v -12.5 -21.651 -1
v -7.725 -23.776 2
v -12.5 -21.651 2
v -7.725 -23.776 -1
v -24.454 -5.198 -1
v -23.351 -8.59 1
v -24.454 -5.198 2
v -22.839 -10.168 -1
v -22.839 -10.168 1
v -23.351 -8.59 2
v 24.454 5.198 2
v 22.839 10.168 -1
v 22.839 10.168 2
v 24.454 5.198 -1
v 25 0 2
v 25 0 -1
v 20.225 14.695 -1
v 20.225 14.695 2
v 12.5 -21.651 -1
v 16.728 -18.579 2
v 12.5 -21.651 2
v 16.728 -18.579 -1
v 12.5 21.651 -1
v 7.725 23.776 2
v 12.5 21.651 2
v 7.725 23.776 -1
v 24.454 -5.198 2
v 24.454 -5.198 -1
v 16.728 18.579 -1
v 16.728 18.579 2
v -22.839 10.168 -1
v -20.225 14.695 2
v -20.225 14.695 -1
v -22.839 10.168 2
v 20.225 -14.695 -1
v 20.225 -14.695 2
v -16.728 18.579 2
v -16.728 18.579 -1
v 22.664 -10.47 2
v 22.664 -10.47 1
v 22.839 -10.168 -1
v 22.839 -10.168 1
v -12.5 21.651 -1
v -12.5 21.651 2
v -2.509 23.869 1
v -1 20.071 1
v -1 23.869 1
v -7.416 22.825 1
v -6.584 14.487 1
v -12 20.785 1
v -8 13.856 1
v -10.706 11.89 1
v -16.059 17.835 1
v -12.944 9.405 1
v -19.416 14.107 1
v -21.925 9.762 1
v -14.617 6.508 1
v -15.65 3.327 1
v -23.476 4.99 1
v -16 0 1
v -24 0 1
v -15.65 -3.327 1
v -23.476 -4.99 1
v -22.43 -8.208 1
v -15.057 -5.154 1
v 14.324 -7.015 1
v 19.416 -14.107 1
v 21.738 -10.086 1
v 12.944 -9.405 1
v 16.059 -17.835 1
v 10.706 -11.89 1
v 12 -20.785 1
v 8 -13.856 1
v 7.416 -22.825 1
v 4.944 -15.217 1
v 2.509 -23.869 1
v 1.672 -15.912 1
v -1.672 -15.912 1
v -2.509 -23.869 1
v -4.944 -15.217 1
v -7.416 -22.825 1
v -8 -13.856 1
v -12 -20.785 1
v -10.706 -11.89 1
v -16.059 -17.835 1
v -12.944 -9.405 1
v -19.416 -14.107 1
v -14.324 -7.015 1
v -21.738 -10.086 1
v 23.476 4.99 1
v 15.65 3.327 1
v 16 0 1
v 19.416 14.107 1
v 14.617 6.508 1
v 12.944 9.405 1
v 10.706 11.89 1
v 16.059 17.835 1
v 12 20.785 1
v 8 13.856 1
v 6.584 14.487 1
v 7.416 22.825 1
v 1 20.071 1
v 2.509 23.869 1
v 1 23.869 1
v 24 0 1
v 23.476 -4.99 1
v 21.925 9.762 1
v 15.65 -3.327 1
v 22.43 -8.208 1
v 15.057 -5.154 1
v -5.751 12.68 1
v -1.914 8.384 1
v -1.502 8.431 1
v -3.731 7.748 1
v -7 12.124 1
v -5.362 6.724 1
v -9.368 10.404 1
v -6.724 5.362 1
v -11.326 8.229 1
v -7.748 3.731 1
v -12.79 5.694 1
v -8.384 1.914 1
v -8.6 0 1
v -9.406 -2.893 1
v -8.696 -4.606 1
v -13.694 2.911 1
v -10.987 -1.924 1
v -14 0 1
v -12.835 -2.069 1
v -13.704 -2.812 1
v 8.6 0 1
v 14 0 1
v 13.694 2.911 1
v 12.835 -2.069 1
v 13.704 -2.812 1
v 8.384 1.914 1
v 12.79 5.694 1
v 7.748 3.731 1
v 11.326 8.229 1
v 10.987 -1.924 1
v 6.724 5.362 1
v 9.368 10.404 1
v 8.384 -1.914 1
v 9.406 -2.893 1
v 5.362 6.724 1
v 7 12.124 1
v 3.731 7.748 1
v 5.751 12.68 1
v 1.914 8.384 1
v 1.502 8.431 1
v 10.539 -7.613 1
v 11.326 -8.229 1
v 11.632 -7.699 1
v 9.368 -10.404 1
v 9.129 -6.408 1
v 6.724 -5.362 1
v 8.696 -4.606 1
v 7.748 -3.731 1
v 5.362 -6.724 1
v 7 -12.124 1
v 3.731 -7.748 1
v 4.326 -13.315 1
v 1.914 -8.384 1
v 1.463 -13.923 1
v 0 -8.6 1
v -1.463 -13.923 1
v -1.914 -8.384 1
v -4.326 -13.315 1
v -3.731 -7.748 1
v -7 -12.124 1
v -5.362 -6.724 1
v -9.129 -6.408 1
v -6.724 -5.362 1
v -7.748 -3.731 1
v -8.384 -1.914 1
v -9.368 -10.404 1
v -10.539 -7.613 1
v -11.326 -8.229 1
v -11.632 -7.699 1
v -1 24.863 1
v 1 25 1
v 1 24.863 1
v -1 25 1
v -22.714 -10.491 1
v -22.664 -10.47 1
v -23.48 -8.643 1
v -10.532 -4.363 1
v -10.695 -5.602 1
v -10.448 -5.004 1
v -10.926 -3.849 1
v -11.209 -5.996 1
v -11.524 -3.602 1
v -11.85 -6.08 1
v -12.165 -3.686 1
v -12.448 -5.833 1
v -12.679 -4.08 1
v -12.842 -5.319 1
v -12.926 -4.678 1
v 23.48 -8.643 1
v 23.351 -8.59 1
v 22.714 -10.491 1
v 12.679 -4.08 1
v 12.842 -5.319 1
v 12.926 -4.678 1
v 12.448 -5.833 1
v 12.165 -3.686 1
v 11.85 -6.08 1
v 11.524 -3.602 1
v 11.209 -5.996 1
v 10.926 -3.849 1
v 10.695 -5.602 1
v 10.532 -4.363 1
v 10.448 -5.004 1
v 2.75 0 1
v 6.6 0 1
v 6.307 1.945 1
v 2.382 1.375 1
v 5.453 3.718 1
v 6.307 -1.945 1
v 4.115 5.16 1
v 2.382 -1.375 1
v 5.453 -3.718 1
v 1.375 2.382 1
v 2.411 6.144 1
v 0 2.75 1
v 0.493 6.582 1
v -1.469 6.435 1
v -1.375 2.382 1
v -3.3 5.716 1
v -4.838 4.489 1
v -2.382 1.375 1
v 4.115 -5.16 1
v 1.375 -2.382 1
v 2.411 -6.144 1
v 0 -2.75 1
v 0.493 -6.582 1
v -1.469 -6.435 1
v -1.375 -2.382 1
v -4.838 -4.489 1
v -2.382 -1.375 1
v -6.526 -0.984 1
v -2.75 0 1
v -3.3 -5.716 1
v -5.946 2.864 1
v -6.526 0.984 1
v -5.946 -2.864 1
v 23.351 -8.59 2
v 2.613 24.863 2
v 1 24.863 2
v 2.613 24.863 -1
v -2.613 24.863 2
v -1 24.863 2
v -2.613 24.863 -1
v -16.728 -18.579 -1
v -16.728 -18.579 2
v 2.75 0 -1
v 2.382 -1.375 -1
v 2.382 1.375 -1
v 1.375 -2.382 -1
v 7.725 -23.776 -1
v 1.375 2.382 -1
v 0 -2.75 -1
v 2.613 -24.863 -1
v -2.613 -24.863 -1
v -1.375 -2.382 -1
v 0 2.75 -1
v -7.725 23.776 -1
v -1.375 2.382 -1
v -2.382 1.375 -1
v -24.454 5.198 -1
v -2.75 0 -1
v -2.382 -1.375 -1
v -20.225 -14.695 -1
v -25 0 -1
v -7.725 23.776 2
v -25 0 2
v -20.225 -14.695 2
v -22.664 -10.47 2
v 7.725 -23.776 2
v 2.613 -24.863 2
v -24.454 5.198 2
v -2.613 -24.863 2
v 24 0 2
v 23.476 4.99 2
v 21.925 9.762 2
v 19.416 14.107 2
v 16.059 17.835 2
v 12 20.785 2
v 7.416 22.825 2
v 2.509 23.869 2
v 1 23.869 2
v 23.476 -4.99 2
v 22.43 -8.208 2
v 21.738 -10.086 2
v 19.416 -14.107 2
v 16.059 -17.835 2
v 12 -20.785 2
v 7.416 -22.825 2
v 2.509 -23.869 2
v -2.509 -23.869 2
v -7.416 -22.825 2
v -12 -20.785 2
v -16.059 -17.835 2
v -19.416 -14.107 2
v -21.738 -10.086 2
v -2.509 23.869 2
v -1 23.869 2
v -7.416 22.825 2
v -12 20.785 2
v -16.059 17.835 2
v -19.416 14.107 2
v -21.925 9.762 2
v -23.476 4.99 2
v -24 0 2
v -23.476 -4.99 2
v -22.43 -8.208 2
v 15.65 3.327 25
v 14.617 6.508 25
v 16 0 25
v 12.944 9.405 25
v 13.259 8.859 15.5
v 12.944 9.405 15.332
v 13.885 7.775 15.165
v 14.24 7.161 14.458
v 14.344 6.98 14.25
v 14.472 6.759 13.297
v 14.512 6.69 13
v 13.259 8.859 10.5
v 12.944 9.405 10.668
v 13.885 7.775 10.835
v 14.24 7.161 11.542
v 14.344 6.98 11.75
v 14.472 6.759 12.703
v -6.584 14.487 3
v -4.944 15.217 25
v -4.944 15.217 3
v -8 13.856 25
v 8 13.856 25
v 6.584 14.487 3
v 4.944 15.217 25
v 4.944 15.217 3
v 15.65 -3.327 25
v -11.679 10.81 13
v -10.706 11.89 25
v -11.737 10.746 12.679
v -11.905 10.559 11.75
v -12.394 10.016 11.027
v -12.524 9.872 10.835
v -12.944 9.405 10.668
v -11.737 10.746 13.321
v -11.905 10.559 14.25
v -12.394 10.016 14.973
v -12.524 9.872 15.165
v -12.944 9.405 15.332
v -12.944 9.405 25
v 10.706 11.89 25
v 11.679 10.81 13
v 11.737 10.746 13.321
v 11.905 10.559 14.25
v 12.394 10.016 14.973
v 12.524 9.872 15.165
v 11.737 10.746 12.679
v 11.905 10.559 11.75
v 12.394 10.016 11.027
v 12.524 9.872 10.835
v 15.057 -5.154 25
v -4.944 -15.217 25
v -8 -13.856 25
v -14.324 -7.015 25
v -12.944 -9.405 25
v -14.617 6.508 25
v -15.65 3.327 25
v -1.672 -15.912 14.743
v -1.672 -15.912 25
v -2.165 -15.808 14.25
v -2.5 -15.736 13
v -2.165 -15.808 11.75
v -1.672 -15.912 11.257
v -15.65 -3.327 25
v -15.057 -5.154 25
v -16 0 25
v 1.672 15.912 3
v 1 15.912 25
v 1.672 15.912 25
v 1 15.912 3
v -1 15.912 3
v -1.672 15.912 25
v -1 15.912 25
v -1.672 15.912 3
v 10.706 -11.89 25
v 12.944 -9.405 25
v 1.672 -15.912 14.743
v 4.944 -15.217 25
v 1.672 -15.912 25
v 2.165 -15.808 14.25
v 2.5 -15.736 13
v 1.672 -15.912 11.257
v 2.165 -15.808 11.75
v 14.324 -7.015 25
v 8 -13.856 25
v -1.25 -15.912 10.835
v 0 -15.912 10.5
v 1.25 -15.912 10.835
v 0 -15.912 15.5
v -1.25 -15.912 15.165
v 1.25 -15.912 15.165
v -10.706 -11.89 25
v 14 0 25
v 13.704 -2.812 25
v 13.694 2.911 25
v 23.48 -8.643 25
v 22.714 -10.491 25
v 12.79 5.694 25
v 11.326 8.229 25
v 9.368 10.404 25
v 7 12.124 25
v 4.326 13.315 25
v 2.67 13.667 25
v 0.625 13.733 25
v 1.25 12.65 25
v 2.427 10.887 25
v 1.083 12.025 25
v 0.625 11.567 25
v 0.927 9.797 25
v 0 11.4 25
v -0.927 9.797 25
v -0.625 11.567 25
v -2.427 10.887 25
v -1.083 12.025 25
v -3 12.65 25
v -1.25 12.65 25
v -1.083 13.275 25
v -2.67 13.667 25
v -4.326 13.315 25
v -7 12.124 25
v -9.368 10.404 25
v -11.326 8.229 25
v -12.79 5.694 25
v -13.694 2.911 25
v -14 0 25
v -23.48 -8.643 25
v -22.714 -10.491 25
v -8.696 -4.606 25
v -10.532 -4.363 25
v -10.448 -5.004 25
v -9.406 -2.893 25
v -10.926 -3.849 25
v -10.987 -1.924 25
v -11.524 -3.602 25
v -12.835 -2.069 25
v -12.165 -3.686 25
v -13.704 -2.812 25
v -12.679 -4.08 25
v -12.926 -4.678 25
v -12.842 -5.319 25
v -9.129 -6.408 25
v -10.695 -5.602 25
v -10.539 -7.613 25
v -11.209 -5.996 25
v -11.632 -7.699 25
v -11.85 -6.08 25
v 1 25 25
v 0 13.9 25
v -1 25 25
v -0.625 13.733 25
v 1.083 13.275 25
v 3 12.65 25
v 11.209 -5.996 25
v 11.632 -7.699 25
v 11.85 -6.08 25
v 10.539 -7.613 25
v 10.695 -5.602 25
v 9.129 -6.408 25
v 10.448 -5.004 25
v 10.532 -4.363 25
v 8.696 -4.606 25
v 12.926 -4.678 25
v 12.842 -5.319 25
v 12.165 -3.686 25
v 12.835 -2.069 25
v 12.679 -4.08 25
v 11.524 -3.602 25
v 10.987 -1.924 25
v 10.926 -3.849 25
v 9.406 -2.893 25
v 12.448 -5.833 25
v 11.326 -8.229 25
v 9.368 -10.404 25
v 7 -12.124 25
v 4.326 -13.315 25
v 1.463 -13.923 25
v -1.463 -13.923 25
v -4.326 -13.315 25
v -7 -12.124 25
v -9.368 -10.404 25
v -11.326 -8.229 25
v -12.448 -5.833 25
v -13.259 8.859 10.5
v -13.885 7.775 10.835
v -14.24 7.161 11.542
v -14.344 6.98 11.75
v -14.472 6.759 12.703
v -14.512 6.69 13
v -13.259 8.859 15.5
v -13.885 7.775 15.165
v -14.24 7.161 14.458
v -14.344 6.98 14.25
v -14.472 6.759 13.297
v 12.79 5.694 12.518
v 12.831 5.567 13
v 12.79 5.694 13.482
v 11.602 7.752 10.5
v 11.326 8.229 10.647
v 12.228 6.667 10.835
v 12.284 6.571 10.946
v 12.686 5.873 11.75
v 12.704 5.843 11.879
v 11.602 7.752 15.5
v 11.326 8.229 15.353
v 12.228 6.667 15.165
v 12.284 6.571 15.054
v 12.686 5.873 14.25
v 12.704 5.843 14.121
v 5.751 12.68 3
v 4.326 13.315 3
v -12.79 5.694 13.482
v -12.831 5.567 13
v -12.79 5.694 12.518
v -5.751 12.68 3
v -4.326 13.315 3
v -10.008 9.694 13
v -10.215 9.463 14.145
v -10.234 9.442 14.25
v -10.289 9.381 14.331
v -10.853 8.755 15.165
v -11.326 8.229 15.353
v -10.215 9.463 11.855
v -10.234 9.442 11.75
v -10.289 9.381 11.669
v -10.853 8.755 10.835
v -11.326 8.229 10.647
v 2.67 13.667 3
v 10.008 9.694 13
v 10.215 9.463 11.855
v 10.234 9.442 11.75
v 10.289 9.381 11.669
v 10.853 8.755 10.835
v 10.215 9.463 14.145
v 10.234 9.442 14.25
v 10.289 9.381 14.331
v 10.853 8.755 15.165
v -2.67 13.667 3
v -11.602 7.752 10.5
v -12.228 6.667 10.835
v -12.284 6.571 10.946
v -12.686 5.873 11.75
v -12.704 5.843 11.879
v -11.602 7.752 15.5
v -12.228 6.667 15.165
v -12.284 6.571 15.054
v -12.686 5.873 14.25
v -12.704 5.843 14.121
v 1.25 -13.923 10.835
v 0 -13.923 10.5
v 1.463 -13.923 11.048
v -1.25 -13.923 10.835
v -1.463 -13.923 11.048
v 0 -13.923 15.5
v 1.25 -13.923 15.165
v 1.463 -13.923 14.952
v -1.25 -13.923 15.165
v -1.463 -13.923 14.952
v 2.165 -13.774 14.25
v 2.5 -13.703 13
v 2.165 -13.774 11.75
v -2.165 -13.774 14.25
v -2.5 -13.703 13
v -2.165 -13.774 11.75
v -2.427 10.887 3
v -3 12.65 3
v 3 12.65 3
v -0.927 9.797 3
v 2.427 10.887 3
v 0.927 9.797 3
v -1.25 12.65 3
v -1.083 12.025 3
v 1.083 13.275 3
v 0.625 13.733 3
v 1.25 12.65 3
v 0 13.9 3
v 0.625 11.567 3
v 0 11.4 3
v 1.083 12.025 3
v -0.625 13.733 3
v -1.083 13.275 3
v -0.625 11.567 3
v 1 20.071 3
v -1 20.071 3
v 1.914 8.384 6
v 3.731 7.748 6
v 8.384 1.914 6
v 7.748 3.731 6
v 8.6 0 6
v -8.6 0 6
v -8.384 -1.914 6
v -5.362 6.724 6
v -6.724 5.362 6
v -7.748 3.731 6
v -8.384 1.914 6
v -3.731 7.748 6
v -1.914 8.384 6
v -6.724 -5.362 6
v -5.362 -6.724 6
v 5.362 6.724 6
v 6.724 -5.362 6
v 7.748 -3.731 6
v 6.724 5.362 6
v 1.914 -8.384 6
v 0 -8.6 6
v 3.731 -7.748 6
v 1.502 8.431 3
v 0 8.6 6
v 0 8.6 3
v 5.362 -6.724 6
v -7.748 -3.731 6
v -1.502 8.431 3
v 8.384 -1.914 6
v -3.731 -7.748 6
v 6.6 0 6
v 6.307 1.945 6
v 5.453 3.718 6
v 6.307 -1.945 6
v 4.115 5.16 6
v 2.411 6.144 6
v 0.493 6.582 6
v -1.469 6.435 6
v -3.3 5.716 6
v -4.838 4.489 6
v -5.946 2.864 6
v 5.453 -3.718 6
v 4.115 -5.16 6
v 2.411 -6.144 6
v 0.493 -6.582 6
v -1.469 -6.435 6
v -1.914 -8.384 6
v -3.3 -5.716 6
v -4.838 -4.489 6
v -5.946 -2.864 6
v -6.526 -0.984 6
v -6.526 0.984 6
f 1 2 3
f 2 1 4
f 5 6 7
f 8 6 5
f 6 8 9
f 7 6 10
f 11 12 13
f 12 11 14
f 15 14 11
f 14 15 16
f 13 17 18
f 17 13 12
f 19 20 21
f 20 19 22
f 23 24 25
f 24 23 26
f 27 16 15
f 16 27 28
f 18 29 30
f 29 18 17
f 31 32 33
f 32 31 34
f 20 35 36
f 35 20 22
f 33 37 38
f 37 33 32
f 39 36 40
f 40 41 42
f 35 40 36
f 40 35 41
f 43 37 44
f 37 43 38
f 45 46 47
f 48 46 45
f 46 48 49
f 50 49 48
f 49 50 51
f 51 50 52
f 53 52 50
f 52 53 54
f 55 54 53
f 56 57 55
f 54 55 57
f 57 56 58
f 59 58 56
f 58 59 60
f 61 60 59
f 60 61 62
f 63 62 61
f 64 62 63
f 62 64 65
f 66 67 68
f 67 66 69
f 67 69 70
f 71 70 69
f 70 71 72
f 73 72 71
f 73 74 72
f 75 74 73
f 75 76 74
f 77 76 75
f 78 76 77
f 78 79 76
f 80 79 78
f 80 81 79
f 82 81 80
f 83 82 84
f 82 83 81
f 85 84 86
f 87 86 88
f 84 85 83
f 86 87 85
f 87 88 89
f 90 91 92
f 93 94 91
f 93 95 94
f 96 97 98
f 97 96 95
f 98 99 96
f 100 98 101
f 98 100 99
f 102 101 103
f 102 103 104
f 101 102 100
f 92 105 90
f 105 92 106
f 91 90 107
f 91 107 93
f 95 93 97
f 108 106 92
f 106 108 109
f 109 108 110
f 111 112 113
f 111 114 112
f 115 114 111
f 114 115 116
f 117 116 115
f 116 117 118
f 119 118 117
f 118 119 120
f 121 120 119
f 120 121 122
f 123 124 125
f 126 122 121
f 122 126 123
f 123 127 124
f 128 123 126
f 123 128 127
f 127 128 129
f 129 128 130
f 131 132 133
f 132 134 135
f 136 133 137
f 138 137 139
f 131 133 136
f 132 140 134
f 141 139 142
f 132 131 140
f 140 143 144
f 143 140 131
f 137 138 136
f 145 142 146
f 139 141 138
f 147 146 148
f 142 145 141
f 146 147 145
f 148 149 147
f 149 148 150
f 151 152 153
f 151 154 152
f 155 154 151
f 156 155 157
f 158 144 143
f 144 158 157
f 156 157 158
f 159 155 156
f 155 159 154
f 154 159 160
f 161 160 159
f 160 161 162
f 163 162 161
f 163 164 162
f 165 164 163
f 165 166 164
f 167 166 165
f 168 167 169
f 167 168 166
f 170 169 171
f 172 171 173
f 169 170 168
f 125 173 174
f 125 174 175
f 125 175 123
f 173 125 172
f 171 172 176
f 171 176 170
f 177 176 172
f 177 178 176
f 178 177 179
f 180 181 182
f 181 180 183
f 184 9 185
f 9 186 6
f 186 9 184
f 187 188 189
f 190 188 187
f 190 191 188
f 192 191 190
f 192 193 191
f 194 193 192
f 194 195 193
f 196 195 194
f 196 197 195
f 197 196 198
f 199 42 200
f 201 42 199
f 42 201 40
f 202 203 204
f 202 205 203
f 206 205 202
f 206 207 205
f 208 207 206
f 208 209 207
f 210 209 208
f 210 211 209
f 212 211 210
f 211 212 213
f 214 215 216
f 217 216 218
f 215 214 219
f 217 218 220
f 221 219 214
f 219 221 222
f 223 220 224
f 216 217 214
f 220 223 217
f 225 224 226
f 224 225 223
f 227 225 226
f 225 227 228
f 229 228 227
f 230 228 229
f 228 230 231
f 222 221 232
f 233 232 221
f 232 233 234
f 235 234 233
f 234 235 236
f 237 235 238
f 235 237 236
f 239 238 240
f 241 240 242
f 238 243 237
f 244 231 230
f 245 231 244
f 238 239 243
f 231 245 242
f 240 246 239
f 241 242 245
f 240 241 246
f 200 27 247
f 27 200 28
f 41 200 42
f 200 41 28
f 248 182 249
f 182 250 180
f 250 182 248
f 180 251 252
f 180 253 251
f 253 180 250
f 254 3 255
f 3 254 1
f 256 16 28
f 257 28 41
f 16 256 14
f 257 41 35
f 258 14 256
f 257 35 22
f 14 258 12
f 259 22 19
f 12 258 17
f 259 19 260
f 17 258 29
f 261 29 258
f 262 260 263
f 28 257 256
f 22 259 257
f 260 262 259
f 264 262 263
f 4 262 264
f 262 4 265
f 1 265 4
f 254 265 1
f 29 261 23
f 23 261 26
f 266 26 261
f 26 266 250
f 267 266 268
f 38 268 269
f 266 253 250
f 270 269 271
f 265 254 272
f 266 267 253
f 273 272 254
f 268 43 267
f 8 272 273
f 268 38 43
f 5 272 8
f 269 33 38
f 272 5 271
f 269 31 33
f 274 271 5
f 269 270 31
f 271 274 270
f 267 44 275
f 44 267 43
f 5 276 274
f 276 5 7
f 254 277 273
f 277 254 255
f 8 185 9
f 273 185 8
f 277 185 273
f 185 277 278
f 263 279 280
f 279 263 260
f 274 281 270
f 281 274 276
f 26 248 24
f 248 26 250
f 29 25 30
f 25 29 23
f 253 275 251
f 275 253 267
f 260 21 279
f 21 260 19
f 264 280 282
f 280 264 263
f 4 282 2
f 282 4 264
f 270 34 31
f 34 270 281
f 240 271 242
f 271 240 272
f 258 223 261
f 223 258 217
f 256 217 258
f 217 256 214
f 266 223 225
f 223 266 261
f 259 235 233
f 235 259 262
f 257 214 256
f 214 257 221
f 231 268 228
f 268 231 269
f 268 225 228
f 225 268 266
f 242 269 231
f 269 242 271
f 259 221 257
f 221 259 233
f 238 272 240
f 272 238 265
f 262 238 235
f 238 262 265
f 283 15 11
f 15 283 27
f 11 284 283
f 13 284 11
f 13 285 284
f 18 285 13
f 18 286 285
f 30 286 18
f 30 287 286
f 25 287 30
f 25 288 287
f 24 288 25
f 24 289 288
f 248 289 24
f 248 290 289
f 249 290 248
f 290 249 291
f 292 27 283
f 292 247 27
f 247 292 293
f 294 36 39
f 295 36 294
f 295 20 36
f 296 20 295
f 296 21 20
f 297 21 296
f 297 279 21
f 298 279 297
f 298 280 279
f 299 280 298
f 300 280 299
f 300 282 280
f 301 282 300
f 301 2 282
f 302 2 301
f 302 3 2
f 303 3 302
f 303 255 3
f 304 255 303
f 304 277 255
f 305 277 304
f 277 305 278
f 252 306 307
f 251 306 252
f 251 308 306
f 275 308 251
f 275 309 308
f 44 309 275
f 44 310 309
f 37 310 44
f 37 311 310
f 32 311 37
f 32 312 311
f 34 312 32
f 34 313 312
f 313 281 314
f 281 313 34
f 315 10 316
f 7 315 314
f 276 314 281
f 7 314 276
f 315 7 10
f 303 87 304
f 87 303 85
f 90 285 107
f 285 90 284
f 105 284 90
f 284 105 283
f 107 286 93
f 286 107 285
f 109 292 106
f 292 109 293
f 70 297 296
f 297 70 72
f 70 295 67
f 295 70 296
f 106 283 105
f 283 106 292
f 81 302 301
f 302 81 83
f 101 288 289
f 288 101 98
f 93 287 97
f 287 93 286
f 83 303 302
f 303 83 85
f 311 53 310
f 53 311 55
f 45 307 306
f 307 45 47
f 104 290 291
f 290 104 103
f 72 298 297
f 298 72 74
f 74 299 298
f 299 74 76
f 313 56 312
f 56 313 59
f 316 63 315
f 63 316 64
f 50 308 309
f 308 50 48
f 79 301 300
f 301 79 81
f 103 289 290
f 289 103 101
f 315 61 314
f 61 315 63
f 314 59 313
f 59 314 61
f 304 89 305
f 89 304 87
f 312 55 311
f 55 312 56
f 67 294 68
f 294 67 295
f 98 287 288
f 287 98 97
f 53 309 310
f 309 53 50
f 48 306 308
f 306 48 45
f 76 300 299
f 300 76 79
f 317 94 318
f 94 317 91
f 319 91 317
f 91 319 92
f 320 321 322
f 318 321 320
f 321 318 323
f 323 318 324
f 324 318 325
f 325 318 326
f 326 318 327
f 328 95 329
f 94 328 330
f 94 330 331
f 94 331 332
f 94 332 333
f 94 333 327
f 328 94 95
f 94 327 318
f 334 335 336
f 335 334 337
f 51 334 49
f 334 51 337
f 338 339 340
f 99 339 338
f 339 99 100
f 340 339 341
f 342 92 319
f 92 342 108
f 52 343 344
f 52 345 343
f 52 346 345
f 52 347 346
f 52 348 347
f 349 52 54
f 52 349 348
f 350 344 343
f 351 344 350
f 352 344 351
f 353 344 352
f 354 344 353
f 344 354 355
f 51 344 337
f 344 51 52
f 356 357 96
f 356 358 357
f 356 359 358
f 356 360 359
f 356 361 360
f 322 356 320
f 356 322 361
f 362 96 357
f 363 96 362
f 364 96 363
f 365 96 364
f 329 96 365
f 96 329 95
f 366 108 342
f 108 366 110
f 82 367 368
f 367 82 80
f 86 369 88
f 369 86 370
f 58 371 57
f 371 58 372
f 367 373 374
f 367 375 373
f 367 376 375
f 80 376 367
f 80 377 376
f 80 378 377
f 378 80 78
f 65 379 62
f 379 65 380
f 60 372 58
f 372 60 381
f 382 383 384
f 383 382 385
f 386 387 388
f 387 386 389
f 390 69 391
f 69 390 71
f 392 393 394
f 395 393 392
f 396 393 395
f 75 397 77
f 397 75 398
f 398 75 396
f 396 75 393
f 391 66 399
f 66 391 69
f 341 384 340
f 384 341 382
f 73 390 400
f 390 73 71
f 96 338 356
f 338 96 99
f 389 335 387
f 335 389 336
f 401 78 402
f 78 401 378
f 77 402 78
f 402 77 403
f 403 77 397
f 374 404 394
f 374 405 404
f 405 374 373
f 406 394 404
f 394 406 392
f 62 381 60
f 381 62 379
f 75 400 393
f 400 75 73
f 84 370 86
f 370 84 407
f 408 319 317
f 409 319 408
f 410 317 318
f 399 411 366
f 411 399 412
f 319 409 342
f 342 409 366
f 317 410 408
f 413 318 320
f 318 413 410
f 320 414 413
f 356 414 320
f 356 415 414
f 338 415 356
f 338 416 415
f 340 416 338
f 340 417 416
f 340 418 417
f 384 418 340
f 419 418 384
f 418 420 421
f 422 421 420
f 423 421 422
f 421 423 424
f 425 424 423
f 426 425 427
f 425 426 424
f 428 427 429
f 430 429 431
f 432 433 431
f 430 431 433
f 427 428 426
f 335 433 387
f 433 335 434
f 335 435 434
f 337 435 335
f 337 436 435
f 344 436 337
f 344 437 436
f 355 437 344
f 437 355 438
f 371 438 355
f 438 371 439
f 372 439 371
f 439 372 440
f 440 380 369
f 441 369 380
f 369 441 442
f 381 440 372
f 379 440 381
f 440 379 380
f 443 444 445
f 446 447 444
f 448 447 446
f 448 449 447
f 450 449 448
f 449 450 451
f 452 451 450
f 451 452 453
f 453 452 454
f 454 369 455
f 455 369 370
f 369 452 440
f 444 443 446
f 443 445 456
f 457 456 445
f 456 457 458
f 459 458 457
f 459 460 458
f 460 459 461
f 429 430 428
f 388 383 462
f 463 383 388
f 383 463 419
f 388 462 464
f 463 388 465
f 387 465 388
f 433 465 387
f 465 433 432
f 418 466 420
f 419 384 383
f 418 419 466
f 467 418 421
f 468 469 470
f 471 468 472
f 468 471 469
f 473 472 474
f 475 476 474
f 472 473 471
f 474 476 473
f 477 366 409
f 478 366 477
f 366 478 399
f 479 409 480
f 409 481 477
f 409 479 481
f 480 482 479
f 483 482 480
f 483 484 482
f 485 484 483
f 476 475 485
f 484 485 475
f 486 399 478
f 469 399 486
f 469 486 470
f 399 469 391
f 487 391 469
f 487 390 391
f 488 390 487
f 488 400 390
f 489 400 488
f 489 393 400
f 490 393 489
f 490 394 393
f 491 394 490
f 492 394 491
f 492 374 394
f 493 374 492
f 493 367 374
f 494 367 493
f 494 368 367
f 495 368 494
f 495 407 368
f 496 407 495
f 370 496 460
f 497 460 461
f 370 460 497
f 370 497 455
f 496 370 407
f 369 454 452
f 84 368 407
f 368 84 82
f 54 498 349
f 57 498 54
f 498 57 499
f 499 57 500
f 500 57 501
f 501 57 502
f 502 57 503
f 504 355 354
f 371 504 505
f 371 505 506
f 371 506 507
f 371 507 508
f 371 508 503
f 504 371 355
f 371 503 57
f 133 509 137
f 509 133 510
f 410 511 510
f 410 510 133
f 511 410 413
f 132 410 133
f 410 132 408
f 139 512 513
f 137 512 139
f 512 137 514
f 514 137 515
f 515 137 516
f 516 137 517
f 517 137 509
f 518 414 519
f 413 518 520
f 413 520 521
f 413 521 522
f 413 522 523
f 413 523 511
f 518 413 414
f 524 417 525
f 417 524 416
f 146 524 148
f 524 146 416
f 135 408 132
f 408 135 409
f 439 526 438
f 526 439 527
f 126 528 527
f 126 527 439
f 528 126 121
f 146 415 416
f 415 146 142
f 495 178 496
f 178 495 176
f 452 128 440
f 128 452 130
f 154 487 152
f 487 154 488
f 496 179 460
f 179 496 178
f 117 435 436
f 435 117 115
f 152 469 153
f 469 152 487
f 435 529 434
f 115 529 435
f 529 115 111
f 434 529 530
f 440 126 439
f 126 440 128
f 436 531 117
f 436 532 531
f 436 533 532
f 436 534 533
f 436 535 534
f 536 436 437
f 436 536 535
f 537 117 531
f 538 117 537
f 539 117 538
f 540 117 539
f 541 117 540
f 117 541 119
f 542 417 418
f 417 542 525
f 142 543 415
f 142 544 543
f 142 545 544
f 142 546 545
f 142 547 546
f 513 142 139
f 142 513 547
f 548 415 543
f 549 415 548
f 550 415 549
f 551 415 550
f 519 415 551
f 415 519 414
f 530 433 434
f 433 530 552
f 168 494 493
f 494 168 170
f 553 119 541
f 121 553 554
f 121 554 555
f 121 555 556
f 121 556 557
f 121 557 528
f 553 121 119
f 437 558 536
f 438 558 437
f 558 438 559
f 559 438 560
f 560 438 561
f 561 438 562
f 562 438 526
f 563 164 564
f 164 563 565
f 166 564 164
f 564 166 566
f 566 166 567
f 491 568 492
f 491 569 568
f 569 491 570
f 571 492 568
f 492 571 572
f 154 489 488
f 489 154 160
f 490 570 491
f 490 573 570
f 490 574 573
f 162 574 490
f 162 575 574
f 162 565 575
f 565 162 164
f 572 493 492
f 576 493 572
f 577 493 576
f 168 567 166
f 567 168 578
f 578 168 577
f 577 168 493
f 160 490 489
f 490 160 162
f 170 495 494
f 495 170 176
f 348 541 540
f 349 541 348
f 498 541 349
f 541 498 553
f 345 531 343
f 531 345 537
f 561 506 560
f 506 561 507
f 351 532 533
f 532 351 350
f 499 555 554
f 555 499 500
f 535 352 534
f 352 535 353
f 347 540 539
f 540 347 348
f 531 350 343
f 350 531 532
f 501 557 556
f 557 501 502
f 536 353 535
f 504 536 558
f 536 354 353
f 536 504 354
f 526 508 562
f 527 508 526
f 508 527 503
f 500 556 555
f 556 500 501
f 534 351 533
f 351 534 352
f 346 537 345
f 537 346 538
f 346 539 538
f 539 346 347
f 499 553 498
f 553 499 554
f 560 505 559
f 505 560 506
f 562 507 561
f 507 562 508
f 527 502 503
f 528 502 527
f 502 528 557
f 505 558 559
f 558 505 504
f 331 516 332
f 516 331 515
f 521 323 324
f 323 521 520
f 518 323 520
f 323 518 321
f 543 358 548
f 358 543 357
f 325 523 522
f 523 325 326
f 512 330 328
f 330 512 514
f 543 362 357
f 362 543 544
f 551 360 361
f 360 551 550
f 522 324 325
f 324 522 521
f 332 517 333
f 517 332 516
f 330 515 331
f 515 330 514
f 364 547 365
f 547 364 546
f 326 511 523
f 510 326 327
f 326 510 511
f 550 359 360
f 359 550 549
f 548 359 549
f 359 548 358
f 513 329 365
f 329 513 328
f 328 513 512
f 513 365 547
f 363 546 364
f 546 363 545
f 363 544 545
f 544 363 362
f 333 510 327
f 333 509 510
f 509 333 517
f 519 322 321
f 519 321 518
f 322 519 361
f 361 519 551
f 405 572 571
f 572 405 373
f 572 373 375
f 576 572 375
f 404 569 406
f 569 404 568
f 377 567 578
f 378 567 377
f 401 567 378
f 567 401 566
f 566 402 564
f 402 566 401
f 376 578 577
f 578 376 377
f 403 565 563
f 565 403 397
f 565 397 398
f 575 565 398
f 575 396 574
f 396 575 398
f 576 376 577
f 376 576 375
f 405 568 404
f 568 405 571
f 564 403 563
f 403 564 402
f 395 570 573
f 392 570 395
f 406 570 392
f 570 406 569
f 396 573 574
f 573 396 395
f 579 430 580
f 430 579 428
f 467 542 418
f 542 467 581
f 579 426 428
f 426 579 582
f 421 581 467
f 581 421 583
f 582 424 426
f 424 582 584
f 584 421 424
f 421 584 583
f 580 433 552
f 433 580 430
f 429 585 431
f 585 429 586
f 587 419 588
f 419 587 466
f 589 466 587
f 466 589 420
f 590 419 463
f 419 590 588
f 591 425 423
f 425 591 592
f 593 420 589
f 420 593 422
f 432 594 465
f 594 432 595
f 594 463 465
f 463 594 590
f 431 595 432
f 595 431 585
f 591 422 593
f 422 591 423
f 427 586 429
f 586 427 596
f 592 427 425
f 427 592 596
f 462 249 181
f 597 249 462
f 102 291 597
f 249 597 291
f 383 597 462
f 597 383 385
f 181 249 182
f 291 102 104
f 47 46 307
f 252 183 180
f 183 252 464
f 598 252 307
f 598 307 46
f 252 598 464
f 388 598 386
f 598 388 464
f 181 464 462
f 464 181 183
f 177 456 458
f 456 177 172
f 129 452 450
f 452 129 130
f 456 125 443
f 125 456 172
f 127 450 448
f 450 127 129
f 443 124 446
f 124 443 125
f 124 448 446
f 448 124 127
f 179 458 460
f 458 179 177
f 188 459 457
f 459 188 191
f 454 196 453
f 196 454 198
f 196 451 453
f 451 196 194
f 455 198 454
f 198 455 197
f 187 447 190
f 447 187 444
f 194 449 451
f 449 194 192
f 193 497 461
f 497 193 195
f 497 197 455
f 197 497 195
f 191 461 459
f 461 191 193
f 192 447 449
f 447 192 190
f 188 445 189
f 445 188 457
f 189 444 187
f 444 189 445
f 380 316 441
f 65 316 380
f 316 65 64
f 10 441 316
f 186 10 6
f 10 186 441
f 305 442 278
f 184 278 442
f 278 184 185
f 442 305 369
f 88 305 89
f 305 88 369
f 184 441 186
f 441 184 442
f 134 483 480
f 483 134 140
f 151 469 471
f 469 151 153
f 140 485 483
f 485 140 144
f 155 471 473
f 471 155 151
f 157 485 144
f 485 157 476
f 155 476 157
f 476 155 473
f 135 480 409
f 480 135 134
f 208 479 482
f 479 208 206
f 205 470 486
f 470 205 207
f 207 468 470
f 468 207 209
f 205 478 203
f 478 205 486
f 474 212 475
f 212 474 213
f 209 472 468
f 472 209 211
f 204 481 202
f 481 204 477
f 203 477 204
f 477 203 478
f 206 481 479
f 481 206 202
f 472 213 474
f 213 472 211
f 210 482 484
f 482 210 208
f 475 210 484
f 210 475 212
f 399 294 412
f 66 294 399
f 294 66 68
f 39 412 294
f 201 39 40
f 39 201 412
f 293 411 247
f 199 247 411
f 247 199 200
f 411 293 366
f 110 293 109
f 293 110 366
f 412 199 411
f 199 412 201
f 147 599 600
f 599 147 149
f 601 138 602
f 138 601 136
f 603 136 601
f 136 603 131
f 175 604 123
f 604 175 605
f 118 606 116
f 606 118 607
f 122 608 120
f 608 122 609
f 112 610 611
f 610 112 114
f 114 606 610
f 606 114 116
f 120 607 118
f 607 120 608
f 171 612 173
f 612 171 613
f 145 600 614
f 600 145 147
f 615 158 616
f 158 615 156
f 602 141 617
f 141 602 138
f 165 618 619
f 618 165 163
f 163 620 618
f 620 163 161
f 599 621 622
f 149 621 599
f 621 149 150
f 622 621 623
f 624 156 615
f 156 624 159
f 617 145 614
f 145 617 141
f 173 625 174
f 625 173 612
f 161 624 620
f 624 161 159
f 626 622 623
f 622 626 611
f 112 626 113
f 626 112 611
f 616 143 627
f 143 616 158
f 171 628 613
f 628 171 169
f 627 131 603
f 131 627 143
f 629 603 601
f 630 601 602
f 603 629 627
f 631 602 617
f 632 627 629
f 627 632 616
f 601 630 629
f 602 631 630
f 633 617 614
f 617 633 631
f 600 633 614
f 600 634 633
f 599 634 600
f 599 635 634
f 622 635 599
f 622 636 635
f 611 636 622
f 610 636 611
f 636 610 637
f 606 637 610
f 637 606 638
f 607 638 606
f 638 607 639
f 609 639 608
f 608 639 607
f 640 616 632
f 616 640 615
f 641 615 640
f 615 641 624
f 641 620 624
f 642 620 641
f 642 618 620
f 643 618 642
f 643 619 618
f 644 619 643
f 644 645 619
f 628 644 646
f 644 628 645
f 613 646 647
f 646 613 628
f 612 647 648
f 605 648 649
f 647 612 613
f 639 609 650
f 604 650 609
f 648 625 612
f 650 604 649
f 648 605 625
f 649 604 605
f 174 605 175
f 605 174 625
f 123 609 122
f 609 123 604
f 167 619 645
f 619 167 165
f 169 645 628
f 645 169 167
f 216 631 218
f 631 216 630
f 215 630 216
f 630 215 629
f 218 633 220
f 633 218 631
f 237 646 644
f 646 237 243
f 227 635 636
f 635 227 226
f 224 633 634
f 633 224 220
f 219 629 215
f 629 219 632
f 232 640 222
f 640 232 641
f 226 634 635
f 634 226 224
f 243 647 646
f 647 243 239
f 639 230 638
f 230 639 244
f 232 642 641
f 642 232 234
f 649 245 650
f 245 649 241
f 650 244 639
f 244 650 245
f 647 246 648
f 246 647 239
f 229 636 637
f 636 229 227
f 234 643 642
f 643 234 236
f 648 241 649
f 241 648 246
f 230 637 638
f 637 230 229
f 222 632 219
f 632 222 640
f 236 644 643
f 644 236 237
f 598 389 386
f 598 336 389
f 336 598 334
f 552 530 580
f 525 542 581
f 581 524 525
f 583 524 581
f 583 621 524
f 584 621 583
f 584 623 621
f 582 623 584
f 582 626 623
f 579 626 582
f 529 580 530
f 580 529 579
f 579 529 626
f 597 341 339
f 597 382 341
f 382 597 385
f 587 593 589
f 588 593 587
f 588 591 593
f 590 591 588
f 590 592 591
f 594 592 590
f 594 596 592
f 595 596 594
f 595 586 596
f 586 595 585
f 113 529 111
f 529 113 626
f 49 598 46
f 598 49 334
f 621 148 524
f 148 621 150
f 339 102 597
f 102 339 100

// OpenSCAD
// file: common.scad
/*
 * Written by Dermot Tynan, Kalopa Research.
 * GPLv2.
 *
 * All dimensions are in mm.
 */

wall_thickness = 2;

cap_radius = 25;
cap_height = 24;
inner_radius = 14;
screw_post_radius = 3;

gland_position = -10;

wind_shaft_diameter = 4.5;
bearing_height = 5;
bearing_diameter = 13.2;

mast_diameter = 8.1;
mast_collar_length = 20;

rg_angle = 112.5;

/*
 * Define the top/bottom end cap for the piece. The shaft radius is used to specify if the end cap has a shaft hole.
 */
module end_cap(shaft_radius)
{
	union() {
		/*
		 * End Cap
		 */
		if (shaft_radius > 0) {
			difference() {
				color([0.3, 0, 1]) cylinder(r = cap_radius, h = wall_thickness, center = true);
				cylinder(r = shaft_radius, h = wall_thickness + 1, center = true, $fn = 12);
			}
		} else {
			color([0.3, 0, 1]) cylinder(r = cap_radius, h = wall_thickness, center = true);
		}
		/*
		 * Ridge around the end cap.
		 */
		translate([0, 0, wall_thickness / 2])
			difference() {
				color([0.3, 0, 1]) cylinder(r = cap_radius, h = wall_thickness, center = true);
				cylinder(r = cap_radius - 1, h = wall_thickness + 1, center = true);
			}
	}
}

/*
 * Screw holes for mounting to top section...
 */
module m3_screw_hole()
{
	translate([0, inner_radius - screw_post_radius + 3.3/2, 0])
		cylinder(r = 3.2/2, h = wall_thickness + 1, center = true, $fn = 12);
}

module screw_holes()
{
	m3_screw_hole();
	rotate(a = [0, 0, rg_angle])
		m3_screw_hole();
	rotate(a = [0, 0, -rg_angle])
		m3_screw_hole();
}
// main file
/*
 * Written by Dermot Tynan, Kalopa Research.
 * GPLv2.
 *
 * All dimensions are in mm.
 */

include <common.scad>

/*
 * LED Divider and screw post.
 */
module led_divider()
{
	l = cap_radius - inner_radius;
	union() {
		/*
		 * Screw post first...
		 */
		translate([0, inner_radius - screw_post_radius + 3.3/2, 0])
			difference() {
				color([0.5, 0, 0]) cylinder(r = screw_post_radius, h = cap_height, center = true);
				cylinder(r = 2.5/2, h = cap_height + 1, center = true, $fn = 12);
			}
		/*
		 * Now the partition between the LEDs.
		 */
		translate([0, inner_radius + l / 2, 0])
			cube([wall_thickness, l, cap_height], center = true);
	}
}

/*
 * LED mounting hole.
 */
module led_mount()
{
	translate([0, inner_radius + wall_thickness / 2, 0])
		rotate(a = [90, 90, 0])
			cylinder(r = 2.5, h = 3, center = true, $fn = 12);
}

/*
 * Inner housing for pots.
 */
module inner_housing()
{
	union() {
		difference() {
			/*
			 * Main housing is a cylinder minus the inside and minus the
			 * holes for the LEDs.
			 */
			color([0.3, 0, 1]) cylinder(r = inner_radius+wall_thickness, h = cap_height, center = true);
			cylinder(r = inner_radius, h = cap_height + 1, center = true);
			rotate(a = [0, 0, rg_angle/2])
				led_mount();
			rotate(a = [0, 0, -rg_angle/2])
				led_mount();
			rotate(a = [0, 0, 180])
				led_mount();
		}
		/*
		 * Divider walls between the three LEDs.
		 */
		color("silver") led_divider();
		rotate(a = [0, 0, rg_angle])
			color("green") led_divider();
		rotate(a = [0, 0, -rg_angle])
			color("red") led_divider();
		/*
		 * Bearing housing
		 */
		translate([0, 0, -(cap_height - bearing_height) / 2])
			difference() {
				color("blue") cylinder(r = wall_thickness + bearing_diameter/2, h = bearing_height, center = true);
				cylinder(r = bearing_diameter/2, h = bearing_height + 1, center = true);
			}
	}
}

module mhl_upper()
{
	union() {
		end_cap(0.5 + wind_shaft_diameter/2);
		/*
		 * Cheesy triangle to show where the front is.
		 * I'm sure there's a better way, but...
		 */
		translate([0, inner_radius, wall_thickness])
			rotate(a = [0, 0, 45])
				color([0.8, 0.8, 0.3]) cube([10, 10, 2], center = true);
		/*
		 * Add the inner housing...
		 */
		translate([0, 0, (cap_height + wall_thickness)/2])
			inner_housing();
	}
}

mhl_upper();
